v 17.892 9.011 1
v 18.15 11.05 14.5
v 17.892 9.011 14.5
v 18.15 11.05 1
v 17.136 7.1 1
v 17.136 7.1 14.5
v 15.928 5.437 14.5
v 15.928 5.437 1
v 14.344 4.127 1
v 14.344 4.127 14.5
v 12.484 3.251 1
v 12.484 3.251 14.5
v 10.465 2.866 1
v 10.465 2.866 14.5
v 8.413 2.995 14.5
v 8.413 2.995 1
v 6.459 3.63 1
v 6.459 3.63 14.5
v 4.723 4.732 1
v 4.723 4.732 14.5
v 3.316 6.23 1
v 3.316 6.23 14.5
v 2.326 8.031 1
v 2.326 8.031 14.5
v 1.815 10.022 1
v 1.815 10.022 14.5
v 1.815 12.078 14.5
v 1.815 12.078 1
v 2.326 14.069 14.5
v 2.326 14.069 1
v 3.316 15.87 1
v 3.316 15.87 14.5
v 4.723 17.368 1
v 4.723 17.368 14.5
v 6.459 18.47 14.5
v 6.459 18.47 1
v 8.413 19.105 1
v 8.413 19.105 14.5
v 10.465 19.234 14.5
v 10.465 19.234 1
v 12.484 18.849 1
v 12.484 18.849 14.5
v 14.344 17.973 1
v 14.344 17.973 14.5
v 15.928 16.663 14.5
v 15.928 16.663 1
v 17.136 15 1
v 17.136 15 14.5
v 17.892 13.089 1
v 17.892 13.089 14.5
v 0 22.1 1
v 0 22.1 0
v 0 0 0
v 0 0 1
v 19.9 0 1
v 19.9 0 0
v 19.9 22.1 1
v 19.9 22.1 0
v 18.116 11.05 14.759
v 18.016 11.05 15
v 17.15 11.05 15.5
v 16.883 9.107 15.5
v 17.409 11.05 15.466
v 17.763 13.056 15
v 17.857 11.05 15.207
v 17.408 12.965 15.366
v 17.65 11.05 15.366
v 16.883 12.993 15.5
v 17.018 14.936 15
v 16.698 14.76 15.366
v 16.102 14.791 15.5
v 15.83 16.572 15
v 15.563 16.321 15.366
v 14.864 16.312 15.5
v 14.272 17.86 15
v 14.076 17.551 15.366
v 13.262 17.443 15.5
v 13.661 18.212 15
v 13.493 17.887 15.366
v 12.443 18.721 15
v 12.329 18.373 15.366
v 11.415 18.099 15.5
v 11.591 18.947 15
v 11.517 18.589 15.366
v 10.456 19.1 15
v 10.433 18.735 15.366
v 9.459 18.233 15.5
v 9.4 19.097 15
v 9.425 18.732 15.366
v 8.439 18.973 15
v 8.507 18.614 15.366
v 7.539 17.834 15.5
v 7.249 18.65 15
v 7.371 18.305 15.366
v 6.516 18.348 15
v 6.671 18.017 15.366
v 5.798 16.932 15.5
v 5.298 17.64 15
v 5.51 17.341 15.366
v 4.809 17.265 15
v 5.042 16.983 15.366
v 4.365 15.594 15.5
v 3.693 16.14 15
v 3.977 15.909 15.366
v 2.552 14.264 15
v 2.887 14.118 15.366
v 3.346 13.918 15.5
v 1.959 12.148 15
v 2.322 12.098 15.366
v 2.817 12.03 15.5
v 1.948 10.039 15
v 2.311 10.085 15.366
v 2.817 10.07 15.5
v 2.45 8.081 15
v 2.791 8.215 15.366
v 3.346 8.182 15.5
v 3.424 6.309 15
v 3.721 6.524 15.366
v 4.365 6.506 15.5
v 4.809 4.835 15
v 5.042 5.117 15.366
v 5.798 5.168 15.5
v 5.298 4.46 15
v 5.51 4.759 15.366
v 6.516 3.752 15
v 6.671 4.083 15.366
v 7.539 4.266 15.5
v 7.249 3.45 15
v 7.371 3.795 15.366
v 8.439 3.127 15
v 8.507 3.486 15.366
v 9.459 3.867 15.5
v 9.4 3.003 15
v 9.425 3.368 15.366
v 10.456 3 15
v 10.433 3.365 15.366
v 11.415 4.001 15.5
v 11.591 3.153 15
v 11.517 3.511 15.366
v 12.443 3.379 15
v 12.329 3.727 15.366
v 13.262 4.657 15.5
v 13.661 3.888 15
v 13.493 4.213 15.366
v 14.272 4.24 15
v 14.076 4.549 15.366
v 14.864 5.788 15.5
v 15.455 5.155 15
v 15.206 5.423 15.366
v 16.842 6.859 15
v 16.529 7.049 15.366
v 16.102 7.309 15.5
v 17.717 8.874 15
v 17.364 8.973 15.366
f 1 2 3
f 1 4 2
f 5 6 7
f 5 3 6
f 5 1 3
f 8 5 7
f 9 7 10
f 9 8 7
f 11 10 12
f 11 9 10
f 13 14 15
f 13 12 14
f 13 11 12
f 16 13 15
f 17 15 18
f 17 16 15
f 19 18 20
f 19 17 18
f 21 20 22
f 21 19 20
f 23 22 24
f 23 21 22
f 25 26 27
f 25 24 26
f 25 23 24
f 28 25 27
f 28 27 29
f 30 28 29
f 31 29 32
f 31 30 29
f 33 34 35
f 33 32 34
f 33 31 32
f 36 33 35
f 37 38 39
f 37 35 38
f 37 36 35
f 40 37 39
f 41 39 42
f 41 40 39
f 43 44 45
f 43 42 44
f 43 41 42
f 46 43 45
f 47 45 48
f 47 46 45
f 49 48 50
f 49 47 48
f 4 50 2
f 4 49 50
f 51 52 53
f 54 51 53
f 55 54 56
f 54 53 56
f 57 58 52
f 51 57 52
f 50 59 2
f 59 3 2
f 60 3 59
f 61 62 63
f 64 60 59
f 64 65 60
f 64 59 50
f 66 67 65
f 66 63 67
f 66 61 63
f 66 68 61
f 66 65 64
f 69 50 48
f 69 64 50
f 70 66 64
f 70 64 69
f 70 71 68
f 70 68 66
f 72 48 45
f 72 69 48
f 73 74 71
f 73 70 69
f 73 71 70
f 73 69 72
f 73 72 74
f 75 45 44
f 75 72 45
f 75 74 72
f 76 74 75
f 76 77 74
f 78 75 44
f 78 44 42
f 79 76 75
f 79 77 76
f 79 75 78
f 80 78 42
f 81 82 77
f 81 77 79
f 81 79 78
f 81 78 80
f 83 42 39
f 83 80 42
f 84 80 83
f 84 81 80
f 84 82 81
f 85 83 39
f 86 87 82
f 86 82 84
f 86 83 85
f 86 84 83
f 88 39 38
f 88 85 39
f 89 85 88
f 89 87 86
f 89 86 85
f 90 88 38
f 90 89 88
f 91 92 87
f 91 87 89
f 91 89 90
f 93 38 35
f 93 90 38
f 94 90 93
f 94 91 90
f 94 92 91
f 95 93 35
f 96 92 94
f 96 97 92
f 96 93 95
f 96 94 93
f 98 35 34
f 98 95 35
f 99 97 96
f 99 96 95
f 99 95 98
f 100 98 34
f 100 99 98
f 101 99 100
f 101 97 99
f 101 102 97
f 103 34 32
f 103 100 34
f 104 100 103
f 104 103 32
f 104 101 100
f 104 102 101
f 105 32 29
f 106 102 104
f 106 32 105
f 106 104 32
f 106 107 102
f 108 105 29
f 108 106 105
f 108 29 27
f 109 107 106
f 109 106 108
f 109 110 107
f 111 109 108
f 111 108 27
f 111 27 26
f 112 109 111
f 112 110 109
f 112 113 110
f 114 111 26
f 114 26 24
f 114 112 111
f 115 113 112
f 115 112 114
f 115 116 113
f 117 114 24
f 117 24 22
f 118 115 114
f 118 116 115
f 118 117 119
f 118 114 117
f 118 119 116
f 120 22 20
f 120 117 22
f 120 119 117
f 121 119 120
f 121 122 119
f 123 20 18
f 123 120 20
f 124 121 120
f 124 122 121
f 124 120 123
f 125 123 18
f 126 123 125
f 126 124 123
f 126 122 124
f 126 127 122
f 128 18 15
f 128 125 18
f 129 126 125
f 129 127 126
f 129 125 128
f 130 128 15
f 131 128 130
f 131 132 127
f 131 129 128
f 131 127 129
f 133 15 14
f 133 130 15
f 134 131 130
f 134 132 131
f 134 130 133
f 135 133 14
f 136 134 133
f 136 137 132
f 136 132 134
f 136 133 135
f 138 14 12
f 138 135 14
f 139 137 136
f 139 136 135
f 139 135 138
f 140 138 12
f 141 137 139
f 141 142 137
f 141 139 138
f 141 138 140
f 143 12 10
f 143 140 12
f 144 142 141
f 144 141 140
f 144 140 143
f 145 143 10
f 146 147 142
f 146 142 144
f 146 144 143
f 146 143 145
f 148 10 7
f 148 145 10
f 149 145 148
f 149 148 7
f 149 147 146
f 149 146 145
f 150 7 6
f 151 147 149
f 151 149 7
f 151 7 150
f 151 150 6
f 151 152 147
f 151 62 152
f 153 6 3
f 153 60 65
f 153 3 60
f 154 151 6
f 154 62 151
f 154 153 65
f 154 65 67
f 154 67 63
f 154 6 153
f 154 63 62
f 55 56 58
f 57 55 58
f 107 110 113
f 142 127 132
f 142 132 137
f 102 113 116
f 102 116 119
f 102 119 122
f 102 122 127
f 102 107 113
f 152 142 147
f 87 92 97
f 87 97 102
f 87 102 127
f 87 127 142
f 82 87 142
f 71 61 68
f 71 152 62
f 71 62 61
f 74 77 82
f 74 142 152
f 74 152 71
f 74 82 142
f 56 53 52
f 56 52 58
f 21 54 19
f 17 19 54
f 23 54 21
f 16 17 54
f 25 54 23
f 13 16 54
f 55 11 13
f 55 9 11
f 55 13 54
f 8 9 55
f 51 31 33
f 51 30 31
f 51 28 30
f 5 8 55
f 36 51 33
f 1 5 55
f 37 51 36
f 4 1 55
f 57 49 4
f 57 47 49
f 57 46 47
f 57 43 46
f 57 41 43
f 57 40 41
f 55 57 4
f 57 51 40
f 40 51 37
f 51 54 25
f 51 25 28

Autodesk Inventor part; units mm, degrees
ref_plane "YZ Plane" through (0, 0, 0) normal (1, 0, 0) x (0, 1, 0)
ref_plane "XZ Plane" through (0, 0, 0) normal (0, 1, 0) x (-1, 0, 0)
ref_plane "XY Plane" through (0, 0, 0) normal (0, 0, 1) x (1, 0, 0)
sketch "Boceto1" plane through (0, 0, 0) normal (0, 0, 1) x (1, 0, 0)
  line L0 (0, 0) -> (19.9, 0)
  line L1 (19.9, 0) -> (19.9, 22.1)
  line L2 (19.9, 22.1) -> (0, 22.1)
  line L3 (0, 22.1) -> (0, 0)
  circle A0 centre (9.95, 11.05) radius 8.2
  dimension "d0" = 19.9
  dimension "d1" = 22.1
  dimension "d2" = 16.4
extrude "Extrusión1" add sketch "Boceto1" along normal blind 1
extrude "Extrusión2" add sketch "Boceto1" along normal blind 15.5 contours A0
fillet "Empalme1" radius 1 1 edges at (1.75, 11.05, 15.5)
properties part number "LV-MaxSonar-EZ"
